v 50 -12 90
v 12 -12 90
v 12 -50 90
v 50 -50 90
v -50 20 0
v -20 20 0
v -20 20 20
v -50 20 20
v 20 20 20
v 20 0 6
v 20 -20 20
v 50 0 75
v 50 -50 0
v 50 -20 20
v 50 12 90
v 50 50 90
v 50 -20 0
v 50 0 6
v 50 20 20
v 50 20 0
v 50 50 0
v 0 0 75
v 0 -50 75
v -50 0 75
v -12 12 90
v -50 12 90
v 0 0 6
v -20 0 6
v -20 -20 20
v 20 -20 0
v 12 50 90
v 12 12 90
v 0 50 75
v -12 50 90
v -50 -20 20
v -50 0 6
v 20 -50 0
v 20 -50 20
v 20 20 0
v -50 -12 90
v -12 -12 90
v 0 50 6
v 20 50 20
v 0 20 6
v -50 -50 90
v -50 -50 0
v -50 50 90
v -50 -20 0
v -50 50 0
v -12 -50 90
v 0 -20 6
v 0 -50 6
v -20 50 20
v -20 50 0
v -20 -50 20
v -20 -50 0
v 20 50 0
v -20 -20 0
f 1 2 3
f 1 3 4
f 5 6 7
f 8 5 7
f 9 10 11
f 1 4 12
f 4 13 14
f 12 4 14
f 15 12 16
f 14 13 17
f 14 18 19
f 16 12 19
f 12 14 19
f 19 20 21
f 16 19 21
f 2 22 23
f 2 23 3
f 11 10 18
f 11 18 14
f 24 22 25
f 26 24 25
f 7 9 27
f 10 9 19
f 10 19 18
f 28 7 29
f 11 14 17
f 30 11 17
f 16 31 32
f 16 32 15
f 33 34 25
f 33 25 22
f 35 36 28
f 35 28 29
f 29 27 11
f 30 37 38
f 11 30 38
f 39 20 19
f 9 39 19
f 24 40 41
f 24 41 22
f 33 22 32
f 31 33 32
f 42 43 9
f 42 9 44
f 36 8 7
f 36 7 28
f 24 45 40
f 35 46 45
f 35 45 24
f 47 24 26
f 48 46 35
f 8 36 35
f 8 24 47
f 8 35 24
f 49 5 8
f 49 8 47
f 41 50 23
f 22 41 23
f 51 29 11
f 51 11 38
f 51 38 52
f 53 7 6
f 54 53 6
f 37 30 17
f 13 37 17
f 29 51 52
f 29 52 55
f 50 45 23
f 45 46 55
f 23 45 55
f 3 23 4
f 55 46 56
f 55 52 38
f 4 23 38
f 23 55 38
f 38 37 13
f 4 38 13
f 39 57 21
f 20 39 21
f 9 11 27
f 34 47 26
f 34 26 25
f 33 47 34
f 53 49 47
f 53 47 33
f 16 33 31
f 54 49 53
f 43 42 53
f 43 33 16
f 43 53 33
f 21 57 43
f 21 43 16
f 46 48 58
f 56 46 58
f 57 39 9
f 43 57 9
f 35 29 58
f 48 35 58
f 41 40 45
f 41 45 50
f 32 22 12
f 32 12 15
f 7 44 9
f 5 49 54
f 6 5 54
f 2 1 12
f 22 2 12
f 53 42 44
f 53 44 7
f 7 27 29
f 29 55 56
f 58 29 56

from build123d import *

# Parameters (mm, degrees)
F0_W     = 100
F0_H     = 100
F1_DEPTH = 90
F3_DEPTH = 100.001
F5_DEPTH = 100.001
F7_DEPTH = 100.001
F9_DEPTH = 100.001


with BuildPart() as f1:
    # F0 (on Top) → F1 (new body)
    with BuildSketch(Plane.XY):
        Rectangle(F0_W, F0_H)
    extrude(amount=F1_DEPTH)

    # F2 (on face) → F3 (cut, through all)
    with BuildSketch(Plane.YZ.offset(50)):
        Polygon((-20, 20), (-20, 0), (20, 0), (20, 20), (0, 6), align=None)
    extrude(amount=-F3_DEPTH, mode=Mode.SUBTRACT)

    # F4 (on face) → F5 (cut, through all)
    with BuildSketch(Plane.XZ.offset(50)):
        Polygon((-20, 20), (-20, 0), (20, 0), (20, 20), (0, 6), align=None)
    extrude(amount=-F5_DEPTH, mode=Mode.SUBTRACT)

    # F6 (on face) → F7 (cut, through all)
    with BuildSketch(Plane.YZ.offset(50)):
        Polygon((12, 90), (-12, 90), (0, 75), align=None)
    extrude(amount=-F7_DEPTH, mode=Mode.SUBTRACT)

    # F8 (on face) → F9 (cut, through all)
    with BuildSketch(Plane.XZ.offset(50)):
        Polygon((12, 90), (-12, 90), (0, 75), align=None)
    extrude(amount=-F9_DEPTH, mode=Mode.SUBTRACT)


solid = f1.part
